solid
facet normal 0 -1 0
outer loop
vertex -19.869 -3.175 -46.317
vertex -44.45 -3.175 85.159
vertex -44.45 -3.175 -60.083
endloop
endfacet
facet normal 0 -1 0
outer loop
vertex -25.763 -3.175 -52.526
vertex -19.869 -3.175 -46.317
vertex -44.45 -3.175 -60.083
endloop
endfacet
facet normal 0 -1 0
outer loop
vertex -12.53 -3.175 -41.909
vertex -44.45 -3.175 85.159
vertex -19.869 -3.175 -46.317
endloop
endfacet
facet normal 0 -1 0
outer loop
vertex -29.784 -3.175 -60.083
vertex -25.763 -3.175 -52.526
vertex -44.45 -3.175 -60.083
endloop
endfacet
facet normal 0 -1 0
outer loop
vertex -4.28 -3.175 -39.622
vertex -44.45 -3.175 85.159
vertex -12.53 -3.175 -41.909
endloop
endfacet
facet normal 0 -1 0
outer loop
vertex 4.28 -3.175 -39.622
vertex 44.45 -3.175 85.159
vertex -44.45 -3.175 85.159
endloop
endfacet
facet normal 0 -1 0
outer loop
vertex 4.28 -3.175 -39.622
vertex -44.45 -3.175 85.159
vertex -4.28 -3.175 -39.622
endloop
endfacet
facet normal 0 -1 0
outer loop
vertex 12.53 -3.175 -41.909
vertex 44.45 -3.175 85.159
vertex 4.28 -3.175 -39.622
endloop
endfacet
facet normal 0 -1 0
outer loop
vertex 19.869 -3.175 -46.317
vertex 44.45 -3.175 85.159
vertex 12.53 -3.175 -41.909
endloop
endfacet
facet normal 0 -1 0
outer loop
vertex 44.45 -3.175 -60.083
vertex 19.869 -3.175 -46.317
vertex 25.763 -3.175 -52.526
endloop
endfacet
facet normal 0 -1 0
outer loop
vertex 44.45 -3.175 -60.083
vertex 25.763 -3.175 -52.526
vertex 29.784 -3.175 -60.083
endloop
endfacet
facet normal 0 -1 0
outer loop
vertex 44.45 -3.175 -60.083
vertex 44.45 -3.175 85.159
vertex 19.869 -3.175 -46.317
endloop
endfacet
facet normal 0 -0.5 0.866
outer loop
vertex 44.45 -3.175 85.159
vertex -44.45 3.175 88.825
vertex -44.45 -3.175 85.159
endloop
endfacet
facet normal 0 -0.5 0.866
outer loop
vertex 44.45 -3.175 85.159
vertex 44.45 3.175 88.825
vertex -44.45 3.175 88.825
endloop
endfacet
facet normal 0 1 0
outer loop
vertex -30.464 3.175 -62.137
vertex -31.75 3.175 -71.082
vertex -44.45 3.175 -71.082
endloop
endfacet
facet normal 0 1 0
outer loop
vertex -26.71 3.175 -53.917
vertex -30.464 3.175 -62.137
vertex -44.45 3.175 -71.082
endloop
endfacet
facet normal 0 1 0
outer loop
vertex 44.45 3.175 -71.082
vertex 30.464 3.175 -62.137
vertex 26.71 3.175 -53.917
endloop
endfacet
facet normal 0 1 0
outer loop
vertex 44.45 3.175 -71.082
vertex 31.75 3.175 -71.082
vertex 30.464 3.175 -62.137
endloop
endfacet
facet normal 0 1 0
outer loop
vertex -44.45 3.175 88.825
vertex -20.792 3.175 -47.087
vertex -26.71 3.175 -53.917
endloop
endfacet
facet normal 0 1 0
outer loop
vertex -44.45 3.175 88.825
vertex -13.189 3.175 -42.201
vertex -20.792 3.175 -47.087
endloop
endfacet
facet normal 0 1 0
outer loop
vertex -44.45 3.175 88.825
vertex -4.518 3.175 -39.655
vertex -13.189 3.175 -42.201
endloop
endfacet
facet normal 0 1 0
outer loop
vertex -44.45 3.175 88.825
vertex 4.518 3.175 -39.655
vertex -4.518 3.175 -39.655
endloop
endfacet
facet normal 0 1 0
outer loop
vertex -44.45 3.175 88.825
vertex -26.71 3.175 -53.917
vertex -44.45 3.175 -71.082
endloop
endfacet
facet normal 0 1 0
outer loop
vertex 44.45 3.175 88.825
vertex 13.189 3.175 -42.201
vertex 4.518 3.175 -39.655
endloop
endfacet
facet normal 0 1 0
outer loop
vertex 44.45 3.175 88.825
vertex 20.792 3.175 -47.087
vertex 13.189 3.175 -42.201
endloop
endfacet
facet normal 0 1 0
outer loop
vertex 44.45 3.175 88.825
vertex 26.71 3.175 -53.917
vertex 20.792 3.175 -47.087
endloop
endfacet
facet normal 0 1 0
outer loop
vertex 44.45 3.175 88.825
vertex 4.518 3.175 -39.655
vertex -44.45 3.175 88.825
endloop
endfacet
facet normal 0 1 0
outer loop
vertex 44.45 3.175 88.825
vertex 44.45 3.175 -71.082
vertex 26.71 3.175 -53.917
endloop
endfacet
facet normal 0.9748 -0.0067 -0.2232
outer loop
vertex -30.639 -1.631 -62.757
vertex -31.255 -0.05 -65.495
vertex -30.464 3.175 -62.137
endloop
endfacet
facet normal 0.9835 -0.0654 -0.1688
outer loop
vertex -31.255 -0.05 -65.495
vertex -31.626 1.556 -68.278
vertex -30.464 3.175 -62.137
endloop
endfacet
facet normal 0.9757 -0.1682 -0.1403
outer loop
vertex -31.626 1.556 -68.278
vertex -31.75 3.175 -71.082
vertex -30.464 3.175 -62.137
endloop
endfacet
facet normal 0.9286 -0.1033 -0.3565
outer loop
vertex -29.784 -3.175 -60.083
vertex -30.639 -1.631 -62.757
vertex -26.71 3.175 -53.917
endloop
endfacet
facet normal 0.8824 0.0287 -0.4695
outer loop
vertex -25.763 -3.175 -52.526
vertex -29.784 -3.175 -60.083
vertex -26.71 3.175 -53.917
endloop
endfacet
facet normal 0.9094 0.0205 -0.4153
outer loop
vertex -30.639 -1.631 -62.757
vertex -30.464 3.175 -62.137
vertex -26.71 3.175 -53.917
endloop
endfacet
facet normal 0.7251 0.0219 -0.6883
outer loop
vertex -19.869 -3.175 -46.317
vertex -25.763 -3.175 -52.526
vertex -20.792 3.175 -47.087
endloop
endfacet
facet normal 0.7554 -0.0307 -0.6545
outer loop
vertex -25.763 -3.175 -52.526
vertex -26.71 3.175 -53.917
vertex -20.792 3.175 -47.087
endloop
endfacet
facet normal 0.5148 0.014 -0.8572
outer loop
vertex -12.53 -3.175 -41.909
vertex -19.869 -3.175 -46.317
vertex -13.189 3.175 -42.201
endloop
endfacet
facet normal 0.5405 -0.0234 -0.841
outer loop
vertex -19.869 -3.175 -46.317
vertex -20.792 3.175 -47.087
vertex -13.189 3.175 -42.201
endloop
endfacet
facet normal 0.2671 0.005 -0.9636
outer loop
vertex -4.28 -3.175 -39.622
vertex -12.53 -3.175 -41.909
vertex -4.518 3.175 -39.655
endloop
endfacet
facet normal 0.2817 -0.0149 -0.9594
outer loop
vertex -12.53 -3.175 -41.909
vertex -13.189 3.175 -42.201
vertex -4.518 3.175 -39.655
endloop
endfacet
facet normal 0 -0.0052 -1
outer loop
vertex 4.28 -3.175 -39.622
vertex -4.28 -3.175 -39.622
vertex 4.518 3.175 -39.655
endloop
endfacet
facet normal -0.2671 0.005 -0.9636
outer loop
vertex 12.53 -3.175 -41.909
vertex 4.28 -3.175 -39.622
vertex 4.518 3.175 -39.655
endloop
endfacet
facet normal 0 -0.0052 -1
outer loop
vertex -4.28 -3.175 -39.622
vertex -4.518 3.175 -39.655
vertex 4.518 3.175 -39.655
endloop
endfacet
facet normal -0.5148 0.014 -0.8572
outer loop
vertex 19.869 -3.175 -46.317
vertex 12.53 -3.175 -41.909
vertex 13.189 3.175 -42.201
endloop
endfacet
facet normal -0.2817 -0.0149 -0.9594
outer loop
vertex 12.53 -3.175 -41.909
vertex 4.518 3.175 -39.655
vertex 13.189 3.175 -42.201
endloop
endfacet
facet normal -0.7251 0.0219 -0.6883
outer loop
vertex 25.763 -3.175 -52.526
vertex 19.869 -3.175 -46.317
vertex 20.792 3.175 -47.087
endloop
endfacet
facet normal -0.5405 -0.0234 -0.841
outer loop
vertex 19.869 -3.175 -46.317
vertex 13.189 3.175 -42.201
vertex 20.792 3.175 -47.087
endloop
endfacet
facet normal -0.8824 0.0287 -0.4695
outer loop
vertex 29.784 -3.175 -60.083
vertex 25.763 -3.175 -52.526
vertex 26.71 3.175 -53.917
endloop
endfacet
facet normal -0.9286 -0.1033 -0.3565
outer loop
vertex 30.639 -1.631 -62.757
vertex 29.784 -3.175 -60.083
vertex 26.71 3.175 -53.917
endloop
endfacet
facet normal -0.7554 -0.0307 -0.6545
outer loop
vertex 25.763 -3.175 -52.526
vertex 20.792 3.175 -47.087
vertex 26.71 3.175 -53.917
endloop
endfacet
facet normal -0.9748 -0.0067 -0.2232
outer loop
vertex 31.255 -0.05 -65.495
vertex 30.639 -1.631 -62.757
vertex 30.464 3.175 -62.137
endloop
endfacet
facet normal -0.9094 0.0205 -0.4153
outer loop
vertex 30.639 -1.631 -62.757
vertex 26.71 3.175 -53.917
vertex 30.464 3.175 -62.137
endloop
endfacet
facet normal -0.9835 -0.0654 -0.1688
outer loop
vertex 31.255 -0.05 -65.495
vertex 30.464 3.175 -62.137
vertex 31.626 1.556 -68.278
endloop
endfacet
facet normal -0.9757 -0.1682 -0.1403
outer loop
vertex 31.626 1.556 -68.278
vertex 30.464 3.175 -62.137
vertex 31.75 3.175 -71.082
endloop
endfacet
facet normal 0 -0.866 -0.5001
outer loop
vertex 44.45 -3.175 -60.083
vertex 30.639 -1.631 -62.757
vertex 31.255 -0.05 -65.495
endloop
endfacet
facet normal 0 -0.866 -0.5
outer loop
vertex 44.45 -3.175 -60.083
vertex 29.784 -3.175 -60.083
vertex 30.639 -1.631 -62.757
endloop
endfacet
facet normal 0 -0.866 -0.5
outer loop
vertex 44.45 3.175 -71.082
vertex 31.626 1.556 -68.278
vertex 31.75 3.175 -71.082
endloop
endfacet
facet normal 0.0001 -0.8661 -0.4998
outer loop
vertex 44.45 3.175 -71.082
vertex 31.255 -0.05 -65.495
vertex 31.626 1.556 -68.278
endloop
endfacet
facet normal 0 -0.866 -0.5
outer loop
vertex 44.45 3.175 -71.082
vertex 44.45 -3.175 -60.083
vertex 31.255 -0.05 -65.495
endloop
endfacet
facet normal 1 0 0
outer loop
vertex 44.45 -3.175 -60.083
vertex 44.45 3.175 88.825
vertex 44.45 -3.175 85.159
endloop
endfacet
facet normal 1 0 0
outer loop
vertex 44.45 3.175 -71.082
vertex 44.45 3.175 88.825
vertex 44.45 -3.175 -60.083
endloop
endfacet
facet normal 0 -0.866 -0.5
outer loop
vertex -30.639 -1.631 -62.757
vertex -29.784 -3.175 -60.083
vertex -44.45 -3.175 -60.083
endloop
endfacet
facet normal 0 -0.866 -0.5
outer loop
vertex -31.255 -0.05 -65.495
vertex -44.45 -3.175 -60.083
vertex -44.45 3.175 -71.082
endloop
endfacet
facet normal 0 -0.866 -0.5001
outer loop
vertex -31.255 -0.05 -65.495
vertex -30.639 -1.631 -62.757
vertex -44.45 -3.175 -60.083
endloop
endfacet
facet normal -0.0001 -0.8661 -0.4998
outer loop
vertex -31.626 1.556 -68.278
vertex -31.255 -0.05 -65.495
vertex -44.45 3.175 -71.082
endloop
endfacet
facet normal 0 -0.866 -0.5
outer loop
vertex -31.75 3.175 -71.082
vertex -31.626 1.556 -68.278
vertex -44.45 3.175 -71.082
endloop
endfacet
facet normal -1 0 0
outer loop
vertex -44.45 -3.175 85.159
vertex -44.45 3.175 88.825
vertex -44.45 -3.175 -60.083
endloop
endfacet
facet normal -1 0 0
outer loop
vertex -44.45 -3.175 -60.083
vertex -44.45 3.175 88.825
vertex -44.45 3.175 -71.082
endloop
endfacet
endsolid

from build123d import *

# Parameters (mm, degrees)
BOSS_EXTRUDE1_DEPTH = 44.45
CUT_EXTRUDE1_DEPTH  = 7.35


with BuildPart() as part:
    # Sketch3 → Boss-Extrude1 (new body, symmetric)
    with BuildSketch(Plane(origin=(0, 0, 0), x_dir=(0, 0, -1), z_dir=(1, 0, 0))):
        Polygon((-88.825470595, 3.175), (-85.159296386, -3.175), (60.083377372, -3.175), (71.0819, 3.175), align=None)
    extrude(amount=BOSS_EXTRUDE1_DEPTH, both=True)

    # Sketch5 → Cut-Extrude1 (cut, through all)
    with BuildSketch(Plane(origin=(0, 3.175, 0), x_dir=(1, 0, 0), z_dir=(0, 1, 0))):
        with BuildLine():
            ThreePointArc((-31.75, 71.0819), (0, 39.3319), (31.75, 71.0819))
            Line((31.75, 71.0819), (-31.75, 71.0819))
        make_face()
    extrude(amount=-CUT_EXTRUDE1_DEPTH, mode=Mode.SUBTRACT)


solid = part.part
